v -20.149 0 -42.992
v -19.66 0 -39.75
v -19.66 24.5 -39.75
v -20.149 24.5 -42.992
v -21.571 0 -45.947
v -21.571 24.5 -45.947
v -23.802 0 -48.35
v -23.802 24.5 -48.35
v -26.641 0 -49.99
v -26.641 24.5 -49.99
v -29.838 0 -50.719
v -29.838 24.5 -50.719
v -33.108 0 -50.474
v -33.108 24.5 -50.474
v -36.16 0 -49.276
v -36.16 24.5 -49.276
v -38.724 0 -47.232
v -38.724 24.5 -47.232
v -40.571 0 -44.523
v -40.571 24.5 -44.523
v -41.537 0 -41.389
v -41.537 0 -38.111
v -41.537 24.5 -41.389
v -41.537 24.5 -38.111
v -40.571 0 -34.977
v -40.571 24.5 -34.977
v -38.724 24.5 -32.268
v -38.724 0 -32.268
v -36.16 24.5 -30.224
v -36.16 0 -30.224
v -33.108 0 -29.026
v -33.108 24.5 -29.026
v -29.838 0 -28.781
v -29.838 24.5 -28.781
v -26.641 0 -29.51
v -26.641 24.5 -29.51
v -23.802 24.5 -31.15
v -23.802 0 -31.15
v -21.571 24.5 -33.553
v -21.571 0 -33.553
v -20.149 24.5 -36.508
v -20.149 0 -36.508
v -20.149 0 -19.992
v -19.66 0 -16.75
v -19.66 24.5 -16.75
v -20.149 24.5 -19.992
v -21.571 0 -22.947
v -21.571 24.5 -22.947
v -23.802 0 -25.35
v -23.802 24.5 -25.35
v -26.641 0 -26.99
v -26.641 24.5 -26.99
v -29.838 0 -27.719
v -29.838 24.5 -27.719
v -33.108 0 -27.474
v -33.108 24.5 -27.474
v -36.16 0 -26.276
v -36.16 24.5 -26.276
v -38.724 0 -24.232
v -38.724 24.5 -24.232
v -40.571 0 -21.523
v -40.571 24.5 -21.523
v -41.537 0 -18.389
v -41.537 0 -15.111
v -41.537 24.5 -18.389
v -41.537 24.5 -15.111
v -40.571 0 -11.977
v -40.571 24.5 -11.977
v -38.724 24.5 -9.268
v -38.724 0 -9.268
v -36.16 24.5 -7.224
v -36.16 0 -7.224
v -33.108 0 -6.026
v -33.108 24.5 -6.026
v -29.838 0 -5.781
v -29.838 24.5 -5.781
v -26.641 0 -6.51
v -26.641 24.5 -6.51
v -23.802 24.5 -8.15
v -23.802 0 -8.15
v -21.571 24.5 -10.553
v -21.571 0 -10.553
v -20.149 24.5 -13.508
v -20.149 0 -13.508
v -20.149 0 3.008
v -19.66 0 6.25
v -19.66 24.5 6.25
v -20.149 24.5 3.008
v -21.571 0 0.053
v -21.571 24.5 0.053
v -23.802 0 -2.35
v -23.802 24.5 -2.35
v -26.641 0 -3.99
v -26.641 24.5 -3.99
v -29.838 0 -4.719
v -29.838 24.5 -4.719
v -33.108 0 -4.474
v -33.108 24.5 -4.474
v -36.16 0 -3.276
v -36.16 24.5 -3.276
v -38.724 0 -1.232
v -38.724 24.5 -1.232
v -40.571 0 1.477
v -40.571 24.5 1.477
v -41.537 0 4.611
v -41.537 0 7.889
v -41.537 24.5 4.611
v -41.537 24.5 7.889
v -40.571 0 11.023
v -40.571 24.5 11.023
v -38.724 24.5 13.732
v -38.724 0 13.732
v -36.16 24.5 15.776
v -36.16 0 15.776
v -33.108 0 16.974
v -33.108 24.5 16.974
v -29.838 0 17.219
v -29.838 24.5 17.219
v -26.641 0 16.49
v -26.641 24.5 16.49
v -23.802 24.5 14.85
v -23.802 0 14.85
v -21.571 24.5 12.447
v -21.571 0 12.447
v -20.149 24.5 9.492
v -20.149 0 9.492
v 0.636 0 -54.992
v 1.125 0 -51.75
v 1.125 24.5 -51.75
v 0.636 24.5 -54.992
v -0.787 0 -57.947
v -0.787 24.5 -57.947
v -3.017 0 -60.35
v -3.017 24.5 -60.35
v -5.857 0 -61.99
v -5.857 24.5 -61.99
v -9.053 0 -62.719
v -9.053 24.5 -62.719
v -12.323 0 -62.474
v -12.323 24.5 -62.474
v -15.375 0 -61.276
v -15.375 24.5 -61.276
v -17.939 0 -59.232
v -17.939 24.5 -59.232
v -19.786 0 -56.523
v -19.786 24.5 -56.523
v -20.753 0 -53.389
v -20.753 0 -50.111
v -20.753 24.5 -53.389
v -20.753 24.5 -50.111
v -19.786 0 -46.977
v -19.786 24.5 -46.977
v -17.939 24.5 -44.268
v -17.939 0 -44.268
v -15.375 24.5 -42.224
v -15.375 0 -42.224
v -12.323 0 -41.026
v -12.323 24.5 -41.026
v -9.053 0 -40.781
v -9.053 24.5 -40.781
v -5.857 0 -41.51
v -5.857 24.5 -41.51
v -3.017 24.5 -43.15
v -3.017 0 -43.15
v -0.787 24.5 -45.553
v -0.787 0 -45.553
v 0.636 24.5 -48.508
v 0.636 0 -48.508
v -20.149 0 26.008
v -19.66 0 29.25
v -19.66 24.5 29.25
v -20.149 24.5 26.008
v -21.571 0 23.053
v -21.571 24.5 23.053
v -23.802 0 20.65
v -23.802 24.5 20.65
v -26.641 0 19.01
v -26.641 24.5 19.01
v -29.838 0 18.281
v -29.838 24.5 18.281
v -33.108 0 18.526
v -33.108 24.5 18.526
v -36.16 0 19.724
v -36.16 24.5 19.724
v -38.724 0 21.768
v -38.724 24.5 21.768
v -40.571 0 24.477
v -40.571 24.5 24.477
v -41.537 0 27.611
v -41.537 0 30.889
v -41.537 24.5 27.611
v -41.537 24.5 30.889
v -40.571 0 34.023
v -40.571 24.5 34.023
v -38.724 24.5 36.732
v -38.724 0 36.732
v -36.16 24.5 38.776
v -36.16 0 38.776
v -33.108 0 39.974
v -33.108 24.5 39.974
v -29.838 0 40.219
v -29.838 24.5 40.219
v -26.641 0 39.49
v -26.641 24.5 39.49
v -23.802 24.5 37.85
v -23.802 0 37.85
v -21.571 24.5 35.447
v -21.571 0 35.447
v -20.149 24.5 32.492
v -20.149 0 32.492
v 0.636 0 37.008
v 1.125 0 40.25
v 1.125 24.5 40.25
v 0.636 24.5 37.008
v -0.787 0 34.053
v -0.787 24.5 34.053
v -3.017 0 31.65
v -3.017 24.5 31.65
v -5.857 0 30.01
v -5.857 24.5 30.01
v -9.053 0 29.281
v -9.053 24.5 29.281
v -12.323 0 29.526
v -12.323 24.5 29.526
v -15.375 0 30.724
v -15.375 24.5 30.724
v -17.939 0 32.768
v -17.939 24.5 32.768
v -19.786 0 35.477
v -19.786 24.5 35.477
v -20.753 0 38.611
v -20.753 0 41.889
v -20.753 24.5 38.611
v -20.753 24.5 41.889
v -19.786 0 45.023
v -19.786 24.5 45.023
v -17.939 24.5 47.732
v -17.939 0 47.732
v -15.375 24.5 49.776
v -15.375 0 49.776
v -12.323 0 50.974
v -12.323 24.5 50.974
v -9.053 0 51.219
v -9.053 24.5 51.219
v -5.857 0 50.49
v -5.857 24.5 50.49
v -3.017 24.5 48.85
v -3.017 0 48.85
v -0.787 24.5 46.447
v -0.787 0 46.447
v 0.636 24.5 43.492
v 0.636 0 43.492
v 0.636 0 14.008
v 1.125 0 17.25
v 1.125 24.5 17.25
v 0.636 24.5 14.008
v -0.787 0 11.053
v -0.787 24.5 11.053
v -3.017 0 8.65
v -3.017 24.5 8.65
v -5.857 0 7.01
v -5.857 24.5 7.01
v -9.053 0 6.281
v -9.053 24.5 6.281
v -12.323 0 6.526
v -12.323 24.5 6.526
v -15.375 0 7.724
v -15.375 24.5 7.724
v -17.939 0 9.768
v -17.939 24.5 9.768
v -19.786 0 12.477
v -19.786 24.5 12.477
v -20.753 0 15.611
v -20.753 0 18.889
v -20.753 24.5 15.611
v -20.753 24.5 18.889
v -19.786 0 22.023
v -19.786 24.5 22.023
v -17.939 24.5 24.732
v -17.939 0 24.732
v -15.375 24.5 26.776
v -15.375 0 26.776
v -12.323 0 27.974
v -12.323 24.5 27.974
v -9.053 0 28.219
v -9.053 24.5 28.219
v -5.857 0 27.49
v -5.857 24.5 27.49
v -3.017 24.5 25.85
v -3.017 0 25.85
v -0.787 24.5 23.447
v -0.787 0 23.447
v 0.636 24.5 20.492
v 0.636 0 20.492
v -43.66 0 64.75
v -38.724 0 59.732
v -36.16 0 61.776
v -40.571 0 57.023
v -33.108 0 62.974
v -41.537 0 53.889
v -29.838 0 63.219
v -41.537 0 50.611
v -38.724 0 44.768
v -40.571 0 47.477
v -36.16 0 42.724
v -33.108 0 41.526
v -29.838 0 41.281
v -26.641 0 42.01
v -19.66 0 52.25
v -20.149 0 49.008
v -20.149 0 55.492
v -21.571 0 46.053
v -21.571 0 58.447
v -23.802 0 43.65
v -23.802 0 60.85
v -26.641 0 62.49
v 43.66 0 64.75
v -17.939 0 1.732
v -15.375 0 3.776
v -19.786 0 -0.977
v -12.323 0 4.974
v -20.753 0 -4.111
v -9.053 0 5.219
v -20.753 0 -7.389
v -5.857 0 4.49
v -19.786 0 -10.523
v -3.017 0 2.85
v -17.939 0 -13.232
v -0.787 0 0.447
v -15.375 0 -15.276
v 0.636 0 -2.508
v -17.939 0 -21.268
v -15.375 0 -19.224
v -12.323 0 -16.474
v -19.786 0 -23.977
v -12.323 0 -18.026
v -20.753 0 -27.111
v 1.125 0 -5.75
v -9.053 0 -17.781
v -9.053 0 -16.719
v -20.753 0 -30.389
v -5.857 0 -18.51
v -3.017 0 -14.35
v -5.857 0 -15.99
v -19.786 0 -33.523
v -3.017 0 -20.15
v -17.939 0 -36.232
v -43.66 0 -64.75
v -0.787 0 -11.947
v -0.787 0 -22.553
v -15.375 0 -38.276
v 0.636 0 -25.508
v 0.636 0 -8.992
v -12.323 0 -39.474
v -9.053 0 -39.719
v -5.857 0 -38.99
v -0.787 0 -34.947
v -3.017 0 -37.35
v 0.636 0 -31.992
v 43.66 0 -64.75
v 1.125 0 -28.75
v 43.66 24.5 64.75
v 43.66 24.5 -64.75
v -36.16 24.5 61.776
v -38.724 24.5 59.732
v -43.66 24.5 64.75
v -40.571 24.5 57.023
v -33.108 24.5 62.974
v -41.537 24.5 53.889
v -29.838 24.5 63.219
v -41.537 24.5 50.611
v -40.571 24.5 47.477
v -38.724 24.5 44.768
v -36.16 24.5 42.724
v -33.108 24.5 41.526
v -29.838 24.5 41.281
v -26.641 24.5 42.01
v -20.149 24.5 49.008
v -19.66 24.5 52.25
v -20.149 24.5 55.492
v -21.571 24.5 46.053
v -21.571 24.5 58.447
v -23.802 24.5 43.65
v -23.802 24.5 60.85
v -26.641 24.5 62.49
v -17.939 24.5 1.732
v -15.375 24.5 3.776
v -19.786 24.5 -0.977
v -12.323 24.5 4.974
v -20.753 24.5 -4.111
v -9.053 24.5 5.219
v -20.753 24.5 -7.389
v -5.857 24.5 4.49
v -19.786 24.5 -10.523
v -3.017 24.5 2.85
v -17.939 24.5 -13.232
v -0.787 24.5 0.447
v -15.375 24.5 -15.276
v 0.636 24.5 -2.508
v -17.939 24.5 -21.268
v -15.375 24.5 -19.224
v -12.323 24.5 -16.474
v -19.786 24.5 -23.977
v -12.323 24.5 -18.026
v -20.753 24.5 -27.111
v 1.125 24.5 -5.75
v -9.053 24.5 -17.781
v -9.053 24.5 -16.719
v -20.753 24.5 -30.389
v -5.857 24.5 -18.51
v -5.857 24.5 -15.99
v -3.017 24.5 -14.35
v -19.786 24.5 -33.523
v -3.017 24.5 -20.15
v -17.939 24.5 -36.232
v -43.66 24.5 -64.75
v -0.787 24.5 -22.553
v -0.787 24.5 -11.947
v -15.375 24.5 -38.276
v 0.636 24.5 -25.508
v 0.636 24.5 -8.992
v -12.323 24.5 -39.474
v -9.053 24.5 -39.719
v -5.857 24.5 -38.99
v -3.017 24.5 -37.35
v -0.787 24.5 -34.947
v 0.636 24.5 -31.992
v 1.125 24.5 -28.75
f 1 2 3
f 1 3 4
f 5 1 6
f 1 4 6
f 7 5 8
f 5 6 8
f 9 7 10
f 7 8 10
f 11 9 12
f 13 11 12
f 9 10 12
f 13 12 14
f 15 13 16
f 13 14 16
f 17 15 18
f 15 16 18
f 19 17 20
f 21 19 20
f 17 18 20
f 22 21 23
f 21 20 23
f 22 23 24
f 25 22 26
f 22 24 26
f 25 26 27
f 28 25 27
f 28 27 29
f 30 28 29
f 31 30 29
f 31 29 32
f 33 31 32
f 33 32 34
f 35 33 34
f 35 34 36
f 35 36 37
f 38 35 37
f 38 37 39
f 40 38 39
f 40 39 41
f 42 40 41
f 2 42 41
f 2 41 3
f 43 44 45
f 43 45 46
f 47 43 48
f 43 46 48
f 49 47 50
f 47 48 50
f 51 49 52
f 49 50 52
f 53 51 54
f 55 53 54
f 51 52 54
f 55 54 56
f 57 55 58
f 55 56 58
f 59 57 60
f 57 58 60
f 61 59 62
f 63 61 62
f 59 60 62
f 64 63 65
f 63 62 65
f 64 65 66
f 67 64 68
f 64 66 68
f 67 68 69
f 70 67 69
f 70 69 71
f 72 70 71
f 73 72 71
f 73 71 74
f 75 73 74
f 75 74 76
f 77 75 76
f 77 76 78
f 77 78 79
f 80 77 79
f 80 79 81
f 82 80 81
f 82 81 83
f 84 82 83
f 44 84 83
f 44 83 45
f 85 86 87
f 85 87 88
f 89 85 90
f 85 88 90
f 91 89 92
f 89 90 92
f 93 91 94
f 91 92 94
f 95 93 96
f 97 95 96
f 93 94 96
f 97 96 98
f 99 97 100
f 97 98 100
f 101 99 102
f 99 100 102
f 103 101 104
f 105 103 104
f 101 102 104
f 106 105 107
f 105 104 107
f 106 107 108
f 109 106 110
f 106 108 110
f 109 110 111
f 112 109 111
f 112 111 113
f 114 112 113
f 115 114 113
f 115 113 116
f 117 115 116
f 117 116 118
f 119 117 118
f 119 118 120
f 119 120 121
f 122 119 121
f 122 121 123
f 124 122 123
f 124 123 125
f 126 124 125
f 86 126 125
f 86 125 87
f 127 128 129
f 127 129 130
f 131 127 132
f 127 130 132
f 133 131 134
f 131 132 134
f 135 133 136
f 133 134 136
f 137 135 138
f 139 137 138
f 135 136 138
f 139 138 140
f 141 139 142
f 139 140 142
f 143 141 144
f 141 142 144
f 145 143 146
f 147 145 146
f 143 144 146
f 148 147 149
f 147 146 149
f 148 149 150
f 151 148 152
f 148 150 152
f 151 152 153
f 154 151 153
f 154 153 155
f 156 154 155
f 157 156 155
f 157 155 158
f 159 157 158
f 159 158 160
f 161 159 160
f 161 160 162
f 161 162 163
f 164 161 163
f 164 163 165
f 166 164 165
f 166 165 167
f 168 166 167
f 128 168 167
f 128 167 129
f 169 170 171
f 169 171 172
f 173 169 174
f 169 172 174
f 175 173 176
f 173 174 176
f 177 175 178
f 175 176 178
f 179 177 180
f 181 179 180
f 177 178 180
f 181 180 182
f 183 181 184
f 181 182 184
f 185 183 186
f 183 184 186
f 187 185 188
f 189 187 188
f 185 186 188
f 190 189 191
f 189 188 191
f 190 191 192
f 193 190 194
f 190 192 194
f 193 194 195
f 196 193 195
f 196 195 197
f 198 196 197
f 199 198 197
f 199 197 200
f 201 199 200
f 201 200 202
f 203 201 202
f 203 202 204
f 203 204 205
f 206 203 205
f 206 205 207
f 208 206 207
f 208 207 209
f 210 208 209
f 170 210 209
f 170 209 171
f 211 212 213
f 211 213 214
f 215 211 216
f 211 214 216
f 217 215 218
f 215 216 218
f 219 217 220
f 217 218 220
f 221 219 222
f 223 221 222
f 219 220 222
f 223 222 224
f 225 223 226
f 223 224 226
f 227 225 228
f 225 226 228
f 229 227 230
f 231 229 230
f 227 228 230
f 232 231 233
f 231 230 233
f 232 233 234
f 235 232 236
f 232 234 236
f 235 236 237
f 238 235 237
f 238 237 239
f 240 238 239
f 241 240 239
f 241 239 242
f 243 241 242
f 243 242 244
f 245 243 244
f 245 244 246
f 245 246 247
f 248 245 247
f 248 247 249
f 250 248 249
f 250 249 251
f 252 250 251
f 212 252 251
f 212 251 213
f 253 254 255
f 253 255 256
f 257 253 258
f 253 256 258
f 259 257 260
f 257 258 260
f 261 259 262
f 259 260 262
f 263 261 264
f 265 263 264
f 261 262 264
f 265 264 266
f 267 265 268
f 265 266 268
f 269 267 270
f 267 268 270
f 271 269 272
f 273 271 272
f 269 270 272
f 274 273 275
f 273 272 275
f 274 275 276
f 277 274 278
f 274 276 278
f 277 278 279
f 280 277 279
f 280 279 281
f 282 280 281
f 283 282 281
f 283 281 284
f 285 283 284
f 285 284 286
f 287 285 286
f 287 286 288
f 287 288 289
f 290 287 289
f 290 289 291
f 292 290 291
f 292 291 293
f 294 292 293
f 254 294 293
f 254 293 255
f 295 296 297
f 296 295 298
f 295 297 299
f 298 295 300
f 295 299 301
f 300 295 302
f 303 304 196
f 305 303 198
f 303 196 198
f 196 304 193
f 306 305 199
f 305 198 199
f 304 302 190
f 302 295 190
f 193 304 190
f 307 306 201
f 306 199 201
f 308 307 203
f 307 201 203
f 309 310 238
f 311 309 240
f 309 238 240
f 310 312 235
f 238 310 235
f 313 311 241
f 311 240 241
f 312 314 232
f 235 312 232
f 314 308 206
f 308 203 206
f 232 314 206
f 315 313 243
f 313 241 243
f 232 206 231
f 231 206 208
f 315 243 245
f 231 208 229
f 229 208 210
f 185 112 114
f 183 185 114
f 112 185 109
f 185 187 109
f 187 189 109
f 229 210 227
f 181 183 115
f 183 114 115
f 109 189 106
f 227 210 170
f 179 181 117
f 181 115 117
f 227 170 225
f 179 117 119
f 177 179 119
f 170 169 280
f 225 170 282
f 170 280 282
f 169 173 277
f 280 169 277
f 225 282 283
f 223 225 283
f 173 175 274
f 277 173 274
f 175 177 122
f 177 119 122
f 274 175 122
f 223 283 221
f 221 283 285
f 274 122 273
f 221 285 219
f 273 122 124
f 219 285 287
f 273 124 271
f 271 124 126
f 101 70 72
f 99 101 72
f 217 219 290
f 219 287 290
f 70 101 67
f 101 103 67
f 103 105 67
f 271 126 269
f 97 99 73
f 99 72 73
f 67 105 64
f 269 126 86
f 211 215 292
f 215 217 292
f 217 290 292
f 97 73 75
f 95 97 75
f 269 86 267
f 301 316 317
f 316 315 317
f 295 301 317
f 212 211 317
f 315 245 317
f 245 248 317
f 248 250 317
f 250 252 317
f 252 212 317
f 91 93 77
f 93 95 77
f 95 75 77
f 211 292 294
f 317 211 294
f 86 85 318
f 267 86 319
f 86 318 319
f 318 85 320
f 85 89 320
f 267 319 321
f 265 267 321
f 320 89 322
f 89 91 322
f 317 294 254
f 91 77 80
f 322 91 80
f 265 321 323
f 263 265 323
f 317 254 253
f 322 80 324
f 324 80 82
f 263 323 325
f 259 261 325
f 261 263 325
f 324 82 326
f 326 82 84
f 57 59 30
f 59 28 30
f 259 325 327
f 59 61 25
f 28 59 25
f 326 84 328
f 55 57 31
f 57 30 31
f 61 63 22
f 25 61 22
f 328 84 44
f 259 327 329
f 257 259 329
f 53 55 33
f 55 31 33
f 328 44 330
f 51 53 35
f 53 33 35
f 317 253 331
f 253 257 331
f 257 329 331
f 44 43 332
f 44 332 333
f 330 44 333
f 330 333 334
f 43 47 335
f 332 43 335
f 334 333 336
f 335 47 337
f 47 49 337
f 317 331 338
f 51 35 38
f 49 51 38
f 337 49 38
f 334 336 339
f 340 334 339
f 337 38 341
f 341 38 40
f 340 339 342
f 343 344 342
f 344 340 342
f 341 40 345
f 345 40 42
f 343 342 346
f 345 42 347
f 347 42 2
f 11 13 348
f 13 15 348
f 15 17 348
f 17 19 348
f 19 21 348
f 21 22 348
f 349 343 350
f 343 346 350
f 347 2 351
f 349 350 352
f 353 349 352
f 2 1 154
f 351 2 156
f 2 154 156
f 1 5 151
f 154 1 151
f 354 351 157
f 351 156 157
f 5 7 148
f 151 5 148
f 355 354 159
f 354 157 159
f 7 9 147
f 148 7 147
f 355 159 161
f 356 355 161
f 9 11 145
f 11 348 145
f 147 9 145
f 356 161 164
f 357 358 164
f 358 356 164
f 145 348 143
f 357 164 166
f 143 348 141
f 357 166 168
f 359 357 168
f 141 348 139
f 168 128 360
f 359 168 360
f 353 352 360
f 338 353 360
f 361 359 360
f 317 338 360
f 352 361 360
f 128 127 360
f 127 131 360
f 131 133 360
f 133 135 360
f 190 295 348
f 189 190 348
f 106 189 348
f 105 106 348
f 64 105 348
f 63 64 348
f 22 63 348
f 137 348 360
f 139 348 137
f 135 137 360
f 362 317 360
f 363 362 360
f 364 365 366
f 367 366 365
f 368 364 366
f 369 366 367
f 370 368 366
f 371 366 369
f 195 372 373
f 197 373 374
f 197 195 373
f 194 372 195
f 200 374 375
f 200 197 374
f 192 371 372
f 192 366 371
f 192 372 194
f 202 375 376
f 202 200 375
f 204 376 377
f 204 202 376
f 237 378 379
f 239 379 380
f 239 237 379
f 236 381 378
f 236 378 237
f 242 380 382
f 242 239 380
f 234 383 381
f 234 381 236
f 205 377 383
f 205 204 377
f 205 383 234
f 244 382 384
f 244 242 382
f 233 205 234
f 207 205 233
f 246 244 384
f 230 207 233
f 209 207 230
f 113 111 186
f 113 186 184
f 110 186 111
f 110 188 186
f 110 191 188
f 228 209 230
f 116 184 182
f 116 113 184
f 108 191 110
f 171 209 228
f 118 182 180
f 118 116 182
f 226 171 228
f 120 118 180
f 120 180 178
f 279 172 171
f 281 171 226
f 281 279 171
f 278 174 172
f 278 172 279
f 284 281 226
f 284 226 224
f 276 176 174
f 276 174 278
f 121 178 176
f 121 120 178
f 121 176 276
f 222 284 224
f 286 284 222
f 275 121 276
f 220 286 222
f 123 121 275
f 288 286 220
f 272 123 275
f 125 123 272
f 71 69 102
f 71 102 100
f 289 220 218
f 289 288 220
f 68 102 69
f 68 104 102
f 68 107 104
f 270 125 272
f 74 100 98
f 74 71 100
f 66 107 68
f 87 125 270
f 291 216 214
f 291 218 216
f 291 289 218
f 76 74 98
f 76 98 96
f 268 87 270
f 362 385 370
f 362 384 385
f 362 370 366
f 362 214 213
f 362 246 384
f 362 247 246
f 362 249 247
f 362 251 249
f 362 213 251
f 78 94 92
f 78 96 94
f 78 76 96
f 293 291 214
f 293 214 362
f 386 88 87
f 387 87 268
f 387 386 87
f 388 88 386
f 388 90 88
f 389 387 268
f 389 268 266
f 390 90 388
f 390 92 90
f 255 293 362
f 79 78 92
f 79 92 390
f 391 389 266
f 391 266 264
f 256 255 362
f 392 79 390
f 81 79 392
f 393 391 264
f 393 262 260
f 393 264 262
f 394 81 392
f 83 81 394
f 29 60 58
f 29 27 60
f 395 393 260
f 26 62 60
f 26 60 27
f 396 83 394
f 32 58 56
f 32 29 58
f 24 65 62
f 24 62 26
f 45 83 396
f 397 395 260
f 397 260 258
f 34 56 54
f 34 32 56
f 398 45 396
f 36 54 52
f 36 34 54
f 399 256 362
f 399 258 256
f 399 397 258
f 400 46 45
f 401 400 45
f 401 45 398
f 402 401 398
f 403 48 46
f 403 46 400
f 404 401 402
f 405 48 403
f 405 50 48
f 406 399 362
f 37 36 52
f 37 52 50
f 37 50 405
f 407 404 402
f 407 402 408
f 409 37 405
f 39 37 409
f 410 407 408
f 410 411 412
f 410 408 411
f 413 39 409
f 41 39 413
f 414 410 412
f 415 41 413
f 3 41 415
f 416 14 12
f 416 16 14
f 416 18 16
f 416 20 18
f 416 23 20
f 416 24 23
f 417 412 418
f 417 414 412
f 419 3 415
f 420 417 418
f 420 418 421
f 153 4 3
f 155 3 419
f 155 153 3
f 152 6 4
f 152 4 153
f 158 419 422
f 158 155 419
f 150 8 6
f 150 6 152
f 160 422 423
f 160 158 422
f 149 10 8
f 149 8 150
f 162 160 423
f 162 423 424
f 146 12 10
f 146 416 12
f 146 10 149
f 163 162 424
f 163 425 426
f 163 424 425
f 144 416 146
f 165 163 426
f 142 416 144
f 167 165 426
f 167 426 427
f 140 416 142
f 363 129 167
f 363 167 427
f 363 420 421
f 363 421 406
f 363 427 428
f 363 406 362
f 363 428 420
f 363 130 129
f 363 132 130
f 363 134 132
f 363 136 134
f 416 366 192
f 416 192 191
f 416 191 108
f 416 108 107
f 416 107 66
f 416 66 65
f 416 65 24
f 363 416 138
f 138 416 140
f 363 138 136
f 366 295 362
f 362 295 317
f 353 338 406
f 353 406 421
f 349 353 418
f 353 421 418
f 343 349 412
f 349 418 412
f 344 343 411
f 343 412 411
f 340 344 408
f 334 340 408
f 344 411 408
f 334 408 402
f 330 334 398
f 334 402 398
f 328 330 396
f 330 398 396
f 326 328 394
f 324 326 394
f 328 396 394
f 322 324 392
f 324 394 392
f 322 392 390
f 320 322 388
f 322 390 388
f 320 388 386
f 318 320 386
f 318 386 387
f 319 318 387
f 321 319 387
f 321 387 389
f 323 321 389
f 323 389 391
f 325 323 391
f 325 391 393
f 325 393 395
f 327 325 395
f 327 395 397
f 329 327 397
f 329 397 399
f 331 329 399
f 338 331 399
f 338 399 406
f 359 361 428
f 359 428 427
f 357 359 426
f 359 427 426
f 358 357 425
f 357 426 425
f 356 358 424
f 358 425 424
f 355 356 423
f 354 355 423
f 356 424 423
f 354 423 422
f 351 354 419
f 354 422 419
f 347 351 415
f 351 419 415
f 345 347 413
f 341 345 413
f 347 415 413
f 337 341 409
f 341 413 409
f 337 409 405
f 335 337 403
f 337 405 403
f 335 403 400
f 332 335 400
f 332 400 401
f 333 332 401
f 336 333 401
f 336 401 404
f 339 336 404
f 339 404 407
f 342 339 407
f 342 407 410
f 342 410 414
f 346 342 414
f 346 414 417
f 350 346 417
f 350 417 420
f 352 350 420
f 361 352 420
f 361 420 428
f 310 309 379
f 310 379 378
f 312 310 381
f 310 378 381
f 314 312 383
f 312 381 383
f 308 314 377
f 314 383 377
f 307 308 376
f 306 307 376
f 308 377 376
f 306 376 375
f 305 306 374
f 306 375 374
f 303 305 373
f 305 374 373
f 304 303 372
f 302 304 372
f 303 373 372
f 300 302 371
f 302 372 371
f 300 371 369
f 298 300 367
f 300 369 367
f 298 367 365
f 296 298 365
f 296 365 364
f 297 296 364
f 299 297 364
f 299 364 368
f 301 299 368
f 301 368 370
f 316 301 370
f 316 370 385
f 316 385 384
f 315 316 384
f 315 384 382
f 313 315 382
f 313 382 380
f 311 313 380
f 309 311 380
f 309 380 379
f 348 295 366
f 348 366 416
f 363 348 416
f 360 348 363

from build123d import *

# Parameters (mm, degrees)
SKETCH2_W           = 87.32
SKETCH2_H           = 129.5
BOSS_EXTRUDE1_DEPTH = 24.5
SKETCH3_R           = 11
CUT_EXTRUDE1_DEPTH  = 25.5
LPATTERN1_COUNT     = 5
LPATTERN1_PITCH     = 23


with BuildPart() as part:
    # Sketch2 → Boss-Extrude1 (new body)
    with BuildSketch(Plane(origin=(0, 0, 0), x_dir=(1, 0, 0), z_dir=(0, 1, 0))):
        Rectangle(SKETCH2_W, SKETCH2_H)
    extrude(amount=BOSS_EXTRUDE1_DEPTH)

    # Sketch3 → Cut-Extrude1 (cut, through all)
    with BuildSketch(Plane(origin=(0, 24.5, 0), x_dir=(1, 0, 0), z_dir=(0, 1, 0))):
        with Locations((-30.66, 39.75)):
            Circle(SKETCH3_R)
        with Locations((-9.875390309, 51.75)):
            Circle(SKETCH3_R)
    cut_extrude1 = extrude(amount=-CUT_EXTRUDE1_DEPTH, mode=Mode.SUBTRACT)

    # LPattern1: Cut-Extrude1 ×5
    with Locations(*[(0, 0, i * LPATTERN1_PITCH) for i in range(1, LPATTERN1_COUNT)]):
        add(cut_extrude1, mode=Mode.SUBTRACT)


solid = part.part
